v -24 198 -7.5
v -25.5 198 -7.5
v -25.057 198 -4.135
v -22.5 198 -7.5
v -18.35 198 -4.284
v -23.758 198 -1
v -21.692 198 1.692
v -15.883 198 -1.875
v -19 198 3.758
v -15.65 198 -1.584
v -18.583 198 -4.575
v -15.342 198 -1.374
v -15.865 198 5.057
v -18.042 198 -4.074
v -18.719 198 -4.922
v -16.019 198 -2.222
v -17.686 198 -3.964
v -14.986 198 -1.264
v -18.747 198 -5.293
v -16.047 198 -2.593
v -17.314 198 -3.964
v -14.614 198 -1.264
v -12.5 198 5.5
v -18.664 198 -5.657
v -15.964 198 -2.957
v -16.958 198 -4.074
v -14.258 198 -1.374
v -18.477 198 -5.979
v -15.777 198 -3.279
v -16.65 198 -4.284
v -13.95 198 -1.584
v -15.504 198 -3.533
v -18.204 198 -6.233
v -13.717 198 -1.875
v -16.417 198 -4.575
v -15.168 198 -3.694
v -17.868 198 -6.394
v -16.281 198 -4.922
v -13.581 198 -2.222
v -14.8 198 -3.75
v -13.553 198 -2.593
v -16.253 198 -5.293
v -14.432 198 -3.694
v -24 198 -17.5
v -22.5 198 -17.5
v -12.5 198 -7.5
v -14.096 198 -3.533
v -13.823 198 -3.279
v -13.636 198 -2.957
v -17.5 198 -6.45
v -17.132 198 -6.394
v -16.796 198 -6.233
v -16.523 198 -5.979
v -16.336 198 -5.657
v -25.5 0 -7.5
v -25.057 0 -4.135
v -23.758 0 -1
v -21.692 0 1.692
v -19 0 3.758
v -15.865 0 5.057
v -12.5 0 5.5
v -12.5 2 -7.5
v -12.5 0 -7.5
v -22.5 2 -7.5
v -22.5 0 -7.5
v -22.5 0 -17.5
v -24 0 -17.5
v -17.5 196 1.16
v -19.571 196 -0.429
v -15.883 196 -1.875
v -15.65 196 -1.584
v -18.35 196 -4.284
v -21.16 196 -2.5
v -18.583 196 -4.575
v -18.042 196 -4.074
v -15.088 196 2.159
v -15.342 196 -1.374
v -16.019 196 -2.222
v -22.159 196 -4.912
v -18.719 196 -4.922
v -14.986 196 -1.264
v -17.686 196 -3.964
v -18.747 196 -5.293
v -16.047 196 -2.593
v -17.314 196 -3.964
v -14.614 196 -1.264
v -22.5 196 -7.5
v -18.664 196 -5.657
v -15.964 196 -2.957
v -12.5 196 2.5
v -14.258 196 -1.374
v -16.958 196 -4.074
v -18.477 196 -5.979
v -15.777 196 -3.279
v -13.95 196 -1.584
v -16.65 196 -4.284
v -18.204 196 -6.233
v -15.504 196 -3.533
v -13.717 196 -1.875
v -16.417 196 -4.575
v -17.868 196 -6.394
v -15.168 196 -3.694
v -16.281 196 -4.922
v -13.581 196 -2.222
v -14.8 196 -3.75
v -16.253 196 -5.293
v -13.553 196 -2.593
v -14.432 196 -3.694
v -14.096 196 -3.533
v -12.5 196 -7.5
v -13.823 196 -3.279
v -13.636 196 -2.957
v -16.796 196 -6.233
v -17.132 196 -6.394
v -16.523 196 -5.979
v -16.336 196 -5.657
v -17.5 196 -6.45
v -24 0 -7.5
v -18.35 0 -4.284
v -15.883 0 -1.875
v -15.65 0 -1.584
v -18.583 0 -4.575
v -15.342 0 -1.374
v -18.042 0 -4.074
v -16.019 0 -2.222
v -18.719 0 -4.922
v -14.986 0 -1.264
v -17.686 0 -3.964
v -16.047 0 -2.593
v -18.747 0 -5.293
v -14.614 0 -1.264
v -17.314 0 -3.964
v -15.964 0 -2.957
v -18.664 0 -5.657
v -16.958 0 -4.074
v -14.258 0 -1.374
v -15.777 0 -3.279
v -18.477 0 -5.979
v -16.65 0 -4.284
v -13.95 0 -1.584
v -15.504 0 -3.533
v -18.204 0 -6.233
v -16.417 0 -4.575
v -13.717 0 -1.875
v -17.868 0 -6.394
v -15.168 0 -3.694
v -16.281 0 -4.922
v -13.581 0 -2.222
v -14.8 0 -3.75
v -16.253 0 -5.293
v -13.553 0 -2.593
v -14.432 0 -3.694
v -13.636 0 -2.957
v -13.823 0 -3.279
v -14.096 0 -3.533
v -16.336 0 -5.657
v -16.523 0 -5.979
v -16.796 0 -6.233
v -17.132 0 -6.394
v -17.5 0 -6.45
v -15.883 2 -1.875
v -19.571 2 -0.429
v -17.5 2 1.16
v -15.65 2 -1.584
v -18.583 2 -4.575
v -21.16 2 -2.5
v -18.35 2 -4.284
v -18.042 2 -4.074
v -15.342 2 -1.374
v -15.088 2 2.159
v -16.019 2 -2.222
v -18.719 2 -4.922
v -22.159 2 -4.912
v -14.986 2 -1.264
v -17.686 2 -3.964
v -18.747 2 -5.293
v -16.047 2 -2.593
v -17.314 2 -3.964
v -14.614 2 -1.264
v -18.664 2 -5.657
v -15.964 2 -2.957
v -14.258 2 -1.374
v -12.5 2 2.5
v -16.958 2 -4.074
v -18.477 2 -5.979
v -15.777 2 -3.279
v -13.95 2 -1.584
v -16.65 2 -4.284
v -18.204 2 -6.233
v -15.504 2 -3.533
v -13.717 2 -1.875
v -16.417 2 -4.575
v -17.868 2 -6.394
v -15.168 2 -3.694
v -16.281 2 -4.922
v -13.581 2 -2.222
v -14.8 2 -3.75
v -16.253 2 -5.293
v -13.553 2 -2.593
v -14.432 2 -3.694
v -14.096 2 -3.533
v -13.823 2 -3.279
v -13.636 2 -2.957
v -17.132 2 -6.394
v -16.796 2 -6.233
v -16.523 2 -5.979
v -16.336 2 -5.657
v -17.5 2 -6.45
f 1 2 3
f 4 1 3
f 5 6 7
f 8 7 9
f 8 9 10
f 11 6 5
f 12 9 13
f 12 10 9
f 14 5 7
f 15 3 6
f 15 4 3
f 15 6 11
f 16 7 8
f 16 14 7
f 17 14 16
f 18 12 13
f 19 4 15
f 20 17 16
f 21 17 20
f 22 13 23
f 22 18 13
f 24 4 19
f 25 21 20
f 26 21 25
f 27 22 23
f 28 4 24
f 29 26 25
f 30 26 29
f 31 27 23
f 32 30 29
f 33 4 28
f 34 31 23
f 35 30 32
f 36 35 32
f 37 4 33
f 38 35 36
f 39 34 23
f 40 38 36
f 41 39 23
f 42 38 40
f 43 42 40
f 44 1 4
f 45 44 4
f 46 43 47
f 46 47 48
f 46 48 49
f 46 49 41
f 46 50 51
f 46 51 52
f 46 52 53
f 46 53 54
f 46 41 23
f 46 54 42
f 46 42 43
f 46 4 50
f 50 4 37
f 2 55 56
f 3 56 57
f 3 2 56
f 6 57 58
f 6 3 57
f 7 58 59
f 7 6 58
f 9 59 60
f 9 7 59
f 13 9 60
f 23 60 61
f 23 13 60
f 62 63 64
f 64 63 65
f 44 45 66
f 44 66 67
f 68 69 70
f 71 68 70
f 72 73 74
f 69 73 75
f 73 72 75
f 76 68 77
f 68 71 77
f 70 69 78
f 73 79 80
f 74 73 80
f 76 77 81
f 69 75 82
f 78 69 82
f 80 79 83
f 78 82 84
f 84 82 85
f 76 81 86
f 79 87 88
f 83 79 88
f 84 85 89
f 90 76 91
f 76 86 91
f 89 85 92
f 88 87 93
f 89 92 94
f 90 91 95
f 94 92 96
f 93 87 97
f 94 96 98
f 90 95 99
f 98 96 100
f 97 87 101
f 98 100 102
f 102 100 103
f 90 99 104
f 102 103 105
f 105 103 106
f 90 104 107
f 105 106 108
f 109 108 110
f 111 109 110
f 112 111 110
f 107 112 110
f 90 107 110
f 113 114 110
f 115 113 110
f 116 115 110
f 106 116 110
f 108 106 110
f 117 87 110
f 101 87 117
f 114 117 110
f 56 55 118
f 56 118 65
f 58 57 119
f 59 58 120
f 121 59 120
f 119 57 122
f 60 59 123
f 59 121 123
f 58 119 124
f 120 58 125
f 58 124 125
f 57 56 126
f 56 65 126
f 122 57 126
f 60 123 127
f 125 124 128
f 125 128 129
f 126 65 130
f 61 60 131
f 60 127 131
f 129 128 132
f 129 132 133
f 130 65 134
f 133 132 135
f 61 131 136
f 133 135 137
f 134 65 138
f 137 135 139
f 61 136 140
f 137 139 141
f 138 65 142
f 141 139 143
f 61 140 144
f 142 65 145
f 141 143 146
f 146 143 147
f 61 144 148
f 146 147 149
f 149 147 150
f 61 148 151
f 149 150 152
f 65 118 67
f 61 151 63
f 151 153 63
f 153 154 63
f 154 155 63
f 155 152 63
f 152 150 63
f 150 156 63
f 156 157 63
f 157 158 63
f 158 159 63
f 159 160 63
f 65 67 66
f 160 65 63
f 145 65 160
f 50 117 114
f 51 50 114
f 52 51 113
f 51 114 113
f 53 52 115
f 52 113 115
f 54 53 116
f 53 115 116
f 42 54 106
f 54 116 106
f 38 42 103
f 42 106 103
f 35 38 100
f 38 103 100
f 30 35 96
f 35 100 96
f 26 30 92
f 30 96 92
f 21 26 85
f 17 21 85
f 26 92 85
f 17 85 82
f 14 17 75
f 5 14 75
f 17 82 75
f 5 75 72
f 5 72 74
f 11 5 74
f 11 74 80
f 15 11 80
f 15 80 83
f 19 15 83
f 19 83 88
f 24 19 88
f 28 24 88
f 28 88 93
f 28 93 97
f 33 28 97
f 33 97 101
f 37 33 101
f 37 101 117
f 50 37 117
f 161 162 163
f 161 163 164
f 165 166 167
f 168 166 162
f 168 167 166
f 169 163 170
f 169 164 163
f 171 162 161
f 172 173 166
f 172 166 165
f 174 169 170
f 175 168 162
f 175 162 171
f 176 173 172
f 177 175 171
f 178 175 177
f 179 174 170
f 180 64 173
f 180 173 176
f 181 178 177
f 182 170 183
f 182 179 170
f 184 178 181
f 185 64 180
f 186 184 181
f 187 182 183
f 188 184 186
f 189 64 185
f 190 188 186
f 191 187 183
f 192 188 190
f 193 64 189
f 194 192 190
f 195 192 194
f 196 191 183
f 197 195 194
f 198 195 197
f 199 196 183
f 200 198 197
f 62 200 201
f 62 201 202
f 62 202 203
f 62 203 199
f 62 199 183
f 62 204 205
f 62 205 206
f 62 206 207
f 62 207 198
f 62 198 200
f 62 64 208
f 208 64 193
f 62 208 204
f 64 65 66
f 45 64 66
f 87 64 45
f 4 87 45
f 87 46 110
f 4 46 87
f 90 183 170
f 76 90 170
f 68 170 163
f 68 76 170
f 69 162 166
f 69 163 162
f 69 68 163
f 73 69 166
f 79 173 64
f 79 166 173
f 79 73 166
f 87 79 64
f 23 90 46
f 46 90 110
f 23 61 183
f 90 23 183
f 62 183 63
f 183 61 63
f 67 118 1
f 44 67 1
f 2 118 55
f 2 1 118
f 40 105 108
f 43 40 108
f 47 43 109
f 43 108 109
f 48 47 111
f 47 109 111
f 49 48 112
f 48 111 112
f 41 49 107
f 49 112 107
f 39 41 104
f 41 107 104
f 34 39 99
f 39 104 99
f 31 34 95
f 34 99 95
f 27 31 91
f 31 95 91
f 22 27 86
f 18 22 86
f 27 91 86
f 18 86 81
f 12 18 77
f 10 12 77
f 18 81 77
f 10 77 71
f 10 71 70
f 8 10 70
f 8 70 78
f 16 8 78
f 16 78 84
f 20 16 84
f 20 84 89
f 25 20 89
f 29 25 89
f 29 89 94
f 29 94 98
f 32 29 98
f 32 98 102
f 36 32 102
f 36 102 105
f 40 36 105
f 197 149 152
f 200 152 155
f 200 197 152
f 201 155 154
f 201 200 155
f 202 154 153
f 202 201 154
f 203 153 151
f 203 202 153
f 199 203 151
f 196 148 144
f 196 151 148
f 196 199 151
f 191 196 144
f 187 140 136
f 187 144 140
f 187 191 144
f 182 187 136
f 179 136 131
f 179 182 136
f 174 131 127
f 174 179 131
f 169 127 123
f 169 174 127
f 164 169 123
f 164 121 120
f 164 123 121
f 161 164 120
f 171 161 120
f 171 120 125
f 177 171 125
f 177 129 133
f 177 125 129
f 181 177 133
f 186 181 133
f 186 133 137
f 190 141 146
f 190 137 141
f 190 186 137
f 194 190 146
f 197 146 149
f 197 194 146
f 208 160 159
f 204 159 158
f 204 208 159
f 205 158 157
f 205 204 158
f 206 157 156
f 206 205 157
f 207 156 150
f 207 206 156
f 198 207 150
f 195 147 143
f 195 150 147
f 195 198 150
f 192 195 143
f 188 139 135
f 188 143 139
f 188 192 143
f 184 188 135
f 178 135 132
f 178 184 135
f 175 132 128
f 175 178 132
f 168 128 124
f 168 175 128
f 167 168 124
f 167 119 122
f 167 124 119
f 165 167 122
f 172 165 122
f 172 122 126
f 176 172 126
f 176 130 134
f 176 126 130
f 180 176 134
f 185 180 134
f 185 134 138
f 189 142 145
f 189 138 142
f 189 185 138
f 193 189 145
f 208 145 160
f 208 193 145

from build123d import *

# Parameters (mm, degrees)
SKETCH_1_W                  = 30
SKETCH_1_H                  = 11
EXTRUDE_1_DEPTH             = 6
SKETCH_2_W                  = 16
SKETCH_2_H                  = 2
CUT_EXTRUDE_1_DEPTH         = 144
EXTRUDE_2_DEPTH             = 192
SKETCH_4_R                  = 1.75
CUT_EXTRUDE_2_DEPTH         = 144
SKETCH_5_W                  = 11
SKETCH_5_H                  = 198
CUT_EXTRUDE_3_DEPTH         = 2.5
EXTRUDE_3_REACH             = 194.664
EXTRUDE_3_DIRECTION_2_REACH = 194.664
SKETCH_7_W                  = 1.5
SKETCH_7_H                  = 198
EXTRUDE_4_DEPTH             = 10
CUT_EXTRUDE_4_DEPTH         = 40
EXTRUDE_5_DEPTH             = 2
SKETCH_10_R                 = 1.25
CUT_EXTRUDE_5_DEPTH         = 3


with BuildPart() as part:
    # 草图1 → 凸台-拉伸1 (new body)
    with BuildSketch(Plane(origin=(0, 0, 0), x_dir=(1, 0, 0), z_dir=(0, 1, 0))):
        Rectangle(SKETCH_1_W, SKETCH_1_H)
    extrude(amount=EXTRUDE_1_DEPTH)

    # 草图2 → 切除-拉伸1 (cut)
    with BuildSketch(Plane.ZY.offset(15)):
        with Locations((-5.5, 3)):
            Rectangle(SKETCH_2_W, SKETCH_2_H)
    extrude(amount=-CUT_EXTRUDE_1_DEPTH, mode=Mode.SUBTRACT)

    # 草图3 → 凸台-拉伸2 (add)
    with BuildSketch(Plane(origin=(0, 6, 0), x_dir=(1, 0, 0), z_dir=(0, 1, 0))):
        Polygon((2, 5.5), (-2, 5.5), (-2, -3.5), (-15, -3.5), (-15, -5.5), (15, -5.5), (15, -3.5), (2, -3.5), align=None)
    extrude(amount=EXTRUDE_2_DEPTH)

    # 草图4 → 切除-拉伸2 (cut)
    with BuildSketch(Plane(origin=(0, 6, 0), x_dir=(1, 0, 0), z_dir=(0, 1, 0))):
        with Locations(Location((-7.5, 2, 0), (0, 0, 270))):
            Circle(SKETCH_4_R)
        with Locations(Location((7.5, 2, 0), (0, 0, 270))):
            Circle(SKETCH_4_R)
    extrude(amount=-CUT_EXTRUDE_2_DEPTH, mode=Mode.SUBTRACT)

    # 草图5 → 切除-拉伸3 (cut)
    with BuildSketch(Plane.ZY.offset(15)):
        with Locations((0, 99)):
            Rectangle(SKETCH_5_W, SKETCH_5_H)
    extrude(amount=-CUT_EXTRUDE_3_DEPTH, mode=Mode.SUBTRACT)

    # 凸台-拉伸3: up to this face of the body (flat: up to its plane)
    extrude_3_end = Plane(part.part.faces().sort_by_distance((0.755494505, 198, 2.324175824))[0])
    # 草图6 → 凸台-拉伸3 (add, up to the picked face)
    with BuildSketch(Plane(origin=(0, 6, 0), x_dir=(1, 0, 0), z_dir=(0, 1, 0)), mode=Mode.PRIVATE) as extrude_3_sk1:
        with BuildLine():
            Line((-22.5, 7.5), (-25.5, 7.5))
            ThreePointArc((-25.5, 7.5), (-21.692388155, -1.692388155), (-12.5, -5.5))
            Line((-12.5, -5.5), (-12.5, -2.5))
            ThreePointArc((-12.5, -2.5), (-19.571067812, 0.428932188), (-22.5, 7.5))
        make_face()
    extrude_3_tool1 = split(extrude(extrude_3_sk1.sketch, amount=EXTRUDE_3_REACH, mode=Mode.PRIVATE), bisect_by=extrude_3_end, keep=Keep.BOTH, mode=Mode.PRIVATE)
    add(extrude_3_tool1.solids().sort_by(Axis((-19.862646, 6, -0.137354), (0, 1, 0)))[0])

    # 凸台-拉伸3 direction 2: up to this face of the body (flat: up to its plane)
    extrude_3_direction_2_end = Plane(part.part.faces().sort_by_distance((1.334914955, 0, 0.135863928))[0])
    # 草图6 → 凸台-拉伸3 direction 2 (add, up to the picked face)
    with BuildSketch(Plane(origin=(0, 6, 0), x_dir=(1, 0, 0), z_dir=(0, 1, 0)), mode=Mode.PRIVATE) as extrude_3_direction_2_sk1:
        with BuildLine():
            Line((-22.5, 7.5), (-25.5, 7.5))
            ThreePointArc((-25.5, 7.5), (-21.692388155, -1.692388155), (-12.5, -5.5))
            Line((-12.5, -5.5), (-12.5, -2.5))
            ThreePointArc((-12.5, -2.5), (-19.571067812, 0.428932188), (-22.5, 7.5))
        make_face()
    extrude_3_direction_2_tool1 = split(extrude(extrude_3_direction_2_sk1.sketch, amount=-EXTRUDE_3_DIRECTION_2_REACH, mode=Mode.PRIVATE), bisect_by=extrude_3_direction_2_end, keep=Keep.BOTH, mode=Mode.PRIVATE)
    add(extrude_3_direction_2_tool1.solids().sort_by(Axis((-19.862646, 6, -0.137354), (0, -1, 0)))[0])

    # 草图7 → 凸台-拉伸4 (add)
    with BuildSketch(Plane(origin=(0, 0, -7.5), x_dir=(-1, 0, 0), z_dir=(0, 0, -1))):
        with Locations((23.25, 99)):
            Rectangle(SKETCH_7_W, SKETCH_7_H)
    extrude(amount=EXTRUDE_4_DEPTH)

    # 草图8 → 切除-拉伸4 (cut)
    with BuildSketch(Plane(origin=(-12.5, 0, 0), x_dir=(0, 0, -1), z_dir=(1, 0, 0))):
        Polygon((26.892505746, 198), (-2.5, 198), (-2.5, 6), (-2.5, -9.514717226), (26.892505746, -9.514717226), align=None)
        Polygon((-3.5, 6), (-3.5, 198), (-26.700940199, 198), (-26.700940199, -9.514717226), (-2.5, -9.514717226), (-2.5, 6), align=None)
    extrude(amount=CUT_EXTRUDE_4_DEPTH, mode=Mode.SUBTRACT)


with BuildPart() as cut_extrude_4_kept_piece:
    # of the separate pieces the step leaves, the one the design keeps (cut_extrude_4_pieces_kept)
    add(part.part.solids().sort_by_distance((-22.5, 0, -7.5))[0])

    # 草图9 → 凸台-拉伸5 (add)
    with BuildSketch(Plane(origin=(0, 198, 0), x_dir=(1, 0, 0), z_dir=(0, 1, 0))):
        with BuildLine():
            Line((-12.5, -2.5), (-12.5, 7.5))
            Line((-12.5, 7.5), (-22.5, 7.5))
            ThreePointArc((-22.5, 7.5), (-19.571067812, 0.428932188), (-12.5, -2.5))
        make_face()
    extrude_5 = extrude(amount=-EXTRUDE_5_DEPTH)

    # 草图10 → 切除-拉伸5 (cut)
    with BuildSketch(Plane(origin=(0, 196, 0), x_dir=(-1, 0, 0), z_dir=(0, -1, 0))):
        with Locations(Location((14.8, 2.5, 0), (0, 0, 90))):
            Circle(SKETCH_10_R)
        with Locations(Location((17.5, 5.2, 0), (0, 0, 90))):
            Circle(SKETCH_10_R)
    cut_extrude_5 = extrude(amount=-CUT_EXTRUDE_5_DEPTH, mode=Mode.SUBTRACT)

    # 镜向2: 凸台-拉伸5, 切除-拉伸5 across plane
    add(extrude_5.mirror(Plane(origin=(0, 99, 0), x_dir=(0, 0, 1), z_dir=(0, -1, 0))))
    add(cut_extrude_5.mirror(Plane(origin=(0, 99, 0), x_dir=(0, 0, 1), z_dir=(0, -1, 0))), mode=Mode.SUBTRACT)


solid = cut_extrude_4_kept_piece.part
